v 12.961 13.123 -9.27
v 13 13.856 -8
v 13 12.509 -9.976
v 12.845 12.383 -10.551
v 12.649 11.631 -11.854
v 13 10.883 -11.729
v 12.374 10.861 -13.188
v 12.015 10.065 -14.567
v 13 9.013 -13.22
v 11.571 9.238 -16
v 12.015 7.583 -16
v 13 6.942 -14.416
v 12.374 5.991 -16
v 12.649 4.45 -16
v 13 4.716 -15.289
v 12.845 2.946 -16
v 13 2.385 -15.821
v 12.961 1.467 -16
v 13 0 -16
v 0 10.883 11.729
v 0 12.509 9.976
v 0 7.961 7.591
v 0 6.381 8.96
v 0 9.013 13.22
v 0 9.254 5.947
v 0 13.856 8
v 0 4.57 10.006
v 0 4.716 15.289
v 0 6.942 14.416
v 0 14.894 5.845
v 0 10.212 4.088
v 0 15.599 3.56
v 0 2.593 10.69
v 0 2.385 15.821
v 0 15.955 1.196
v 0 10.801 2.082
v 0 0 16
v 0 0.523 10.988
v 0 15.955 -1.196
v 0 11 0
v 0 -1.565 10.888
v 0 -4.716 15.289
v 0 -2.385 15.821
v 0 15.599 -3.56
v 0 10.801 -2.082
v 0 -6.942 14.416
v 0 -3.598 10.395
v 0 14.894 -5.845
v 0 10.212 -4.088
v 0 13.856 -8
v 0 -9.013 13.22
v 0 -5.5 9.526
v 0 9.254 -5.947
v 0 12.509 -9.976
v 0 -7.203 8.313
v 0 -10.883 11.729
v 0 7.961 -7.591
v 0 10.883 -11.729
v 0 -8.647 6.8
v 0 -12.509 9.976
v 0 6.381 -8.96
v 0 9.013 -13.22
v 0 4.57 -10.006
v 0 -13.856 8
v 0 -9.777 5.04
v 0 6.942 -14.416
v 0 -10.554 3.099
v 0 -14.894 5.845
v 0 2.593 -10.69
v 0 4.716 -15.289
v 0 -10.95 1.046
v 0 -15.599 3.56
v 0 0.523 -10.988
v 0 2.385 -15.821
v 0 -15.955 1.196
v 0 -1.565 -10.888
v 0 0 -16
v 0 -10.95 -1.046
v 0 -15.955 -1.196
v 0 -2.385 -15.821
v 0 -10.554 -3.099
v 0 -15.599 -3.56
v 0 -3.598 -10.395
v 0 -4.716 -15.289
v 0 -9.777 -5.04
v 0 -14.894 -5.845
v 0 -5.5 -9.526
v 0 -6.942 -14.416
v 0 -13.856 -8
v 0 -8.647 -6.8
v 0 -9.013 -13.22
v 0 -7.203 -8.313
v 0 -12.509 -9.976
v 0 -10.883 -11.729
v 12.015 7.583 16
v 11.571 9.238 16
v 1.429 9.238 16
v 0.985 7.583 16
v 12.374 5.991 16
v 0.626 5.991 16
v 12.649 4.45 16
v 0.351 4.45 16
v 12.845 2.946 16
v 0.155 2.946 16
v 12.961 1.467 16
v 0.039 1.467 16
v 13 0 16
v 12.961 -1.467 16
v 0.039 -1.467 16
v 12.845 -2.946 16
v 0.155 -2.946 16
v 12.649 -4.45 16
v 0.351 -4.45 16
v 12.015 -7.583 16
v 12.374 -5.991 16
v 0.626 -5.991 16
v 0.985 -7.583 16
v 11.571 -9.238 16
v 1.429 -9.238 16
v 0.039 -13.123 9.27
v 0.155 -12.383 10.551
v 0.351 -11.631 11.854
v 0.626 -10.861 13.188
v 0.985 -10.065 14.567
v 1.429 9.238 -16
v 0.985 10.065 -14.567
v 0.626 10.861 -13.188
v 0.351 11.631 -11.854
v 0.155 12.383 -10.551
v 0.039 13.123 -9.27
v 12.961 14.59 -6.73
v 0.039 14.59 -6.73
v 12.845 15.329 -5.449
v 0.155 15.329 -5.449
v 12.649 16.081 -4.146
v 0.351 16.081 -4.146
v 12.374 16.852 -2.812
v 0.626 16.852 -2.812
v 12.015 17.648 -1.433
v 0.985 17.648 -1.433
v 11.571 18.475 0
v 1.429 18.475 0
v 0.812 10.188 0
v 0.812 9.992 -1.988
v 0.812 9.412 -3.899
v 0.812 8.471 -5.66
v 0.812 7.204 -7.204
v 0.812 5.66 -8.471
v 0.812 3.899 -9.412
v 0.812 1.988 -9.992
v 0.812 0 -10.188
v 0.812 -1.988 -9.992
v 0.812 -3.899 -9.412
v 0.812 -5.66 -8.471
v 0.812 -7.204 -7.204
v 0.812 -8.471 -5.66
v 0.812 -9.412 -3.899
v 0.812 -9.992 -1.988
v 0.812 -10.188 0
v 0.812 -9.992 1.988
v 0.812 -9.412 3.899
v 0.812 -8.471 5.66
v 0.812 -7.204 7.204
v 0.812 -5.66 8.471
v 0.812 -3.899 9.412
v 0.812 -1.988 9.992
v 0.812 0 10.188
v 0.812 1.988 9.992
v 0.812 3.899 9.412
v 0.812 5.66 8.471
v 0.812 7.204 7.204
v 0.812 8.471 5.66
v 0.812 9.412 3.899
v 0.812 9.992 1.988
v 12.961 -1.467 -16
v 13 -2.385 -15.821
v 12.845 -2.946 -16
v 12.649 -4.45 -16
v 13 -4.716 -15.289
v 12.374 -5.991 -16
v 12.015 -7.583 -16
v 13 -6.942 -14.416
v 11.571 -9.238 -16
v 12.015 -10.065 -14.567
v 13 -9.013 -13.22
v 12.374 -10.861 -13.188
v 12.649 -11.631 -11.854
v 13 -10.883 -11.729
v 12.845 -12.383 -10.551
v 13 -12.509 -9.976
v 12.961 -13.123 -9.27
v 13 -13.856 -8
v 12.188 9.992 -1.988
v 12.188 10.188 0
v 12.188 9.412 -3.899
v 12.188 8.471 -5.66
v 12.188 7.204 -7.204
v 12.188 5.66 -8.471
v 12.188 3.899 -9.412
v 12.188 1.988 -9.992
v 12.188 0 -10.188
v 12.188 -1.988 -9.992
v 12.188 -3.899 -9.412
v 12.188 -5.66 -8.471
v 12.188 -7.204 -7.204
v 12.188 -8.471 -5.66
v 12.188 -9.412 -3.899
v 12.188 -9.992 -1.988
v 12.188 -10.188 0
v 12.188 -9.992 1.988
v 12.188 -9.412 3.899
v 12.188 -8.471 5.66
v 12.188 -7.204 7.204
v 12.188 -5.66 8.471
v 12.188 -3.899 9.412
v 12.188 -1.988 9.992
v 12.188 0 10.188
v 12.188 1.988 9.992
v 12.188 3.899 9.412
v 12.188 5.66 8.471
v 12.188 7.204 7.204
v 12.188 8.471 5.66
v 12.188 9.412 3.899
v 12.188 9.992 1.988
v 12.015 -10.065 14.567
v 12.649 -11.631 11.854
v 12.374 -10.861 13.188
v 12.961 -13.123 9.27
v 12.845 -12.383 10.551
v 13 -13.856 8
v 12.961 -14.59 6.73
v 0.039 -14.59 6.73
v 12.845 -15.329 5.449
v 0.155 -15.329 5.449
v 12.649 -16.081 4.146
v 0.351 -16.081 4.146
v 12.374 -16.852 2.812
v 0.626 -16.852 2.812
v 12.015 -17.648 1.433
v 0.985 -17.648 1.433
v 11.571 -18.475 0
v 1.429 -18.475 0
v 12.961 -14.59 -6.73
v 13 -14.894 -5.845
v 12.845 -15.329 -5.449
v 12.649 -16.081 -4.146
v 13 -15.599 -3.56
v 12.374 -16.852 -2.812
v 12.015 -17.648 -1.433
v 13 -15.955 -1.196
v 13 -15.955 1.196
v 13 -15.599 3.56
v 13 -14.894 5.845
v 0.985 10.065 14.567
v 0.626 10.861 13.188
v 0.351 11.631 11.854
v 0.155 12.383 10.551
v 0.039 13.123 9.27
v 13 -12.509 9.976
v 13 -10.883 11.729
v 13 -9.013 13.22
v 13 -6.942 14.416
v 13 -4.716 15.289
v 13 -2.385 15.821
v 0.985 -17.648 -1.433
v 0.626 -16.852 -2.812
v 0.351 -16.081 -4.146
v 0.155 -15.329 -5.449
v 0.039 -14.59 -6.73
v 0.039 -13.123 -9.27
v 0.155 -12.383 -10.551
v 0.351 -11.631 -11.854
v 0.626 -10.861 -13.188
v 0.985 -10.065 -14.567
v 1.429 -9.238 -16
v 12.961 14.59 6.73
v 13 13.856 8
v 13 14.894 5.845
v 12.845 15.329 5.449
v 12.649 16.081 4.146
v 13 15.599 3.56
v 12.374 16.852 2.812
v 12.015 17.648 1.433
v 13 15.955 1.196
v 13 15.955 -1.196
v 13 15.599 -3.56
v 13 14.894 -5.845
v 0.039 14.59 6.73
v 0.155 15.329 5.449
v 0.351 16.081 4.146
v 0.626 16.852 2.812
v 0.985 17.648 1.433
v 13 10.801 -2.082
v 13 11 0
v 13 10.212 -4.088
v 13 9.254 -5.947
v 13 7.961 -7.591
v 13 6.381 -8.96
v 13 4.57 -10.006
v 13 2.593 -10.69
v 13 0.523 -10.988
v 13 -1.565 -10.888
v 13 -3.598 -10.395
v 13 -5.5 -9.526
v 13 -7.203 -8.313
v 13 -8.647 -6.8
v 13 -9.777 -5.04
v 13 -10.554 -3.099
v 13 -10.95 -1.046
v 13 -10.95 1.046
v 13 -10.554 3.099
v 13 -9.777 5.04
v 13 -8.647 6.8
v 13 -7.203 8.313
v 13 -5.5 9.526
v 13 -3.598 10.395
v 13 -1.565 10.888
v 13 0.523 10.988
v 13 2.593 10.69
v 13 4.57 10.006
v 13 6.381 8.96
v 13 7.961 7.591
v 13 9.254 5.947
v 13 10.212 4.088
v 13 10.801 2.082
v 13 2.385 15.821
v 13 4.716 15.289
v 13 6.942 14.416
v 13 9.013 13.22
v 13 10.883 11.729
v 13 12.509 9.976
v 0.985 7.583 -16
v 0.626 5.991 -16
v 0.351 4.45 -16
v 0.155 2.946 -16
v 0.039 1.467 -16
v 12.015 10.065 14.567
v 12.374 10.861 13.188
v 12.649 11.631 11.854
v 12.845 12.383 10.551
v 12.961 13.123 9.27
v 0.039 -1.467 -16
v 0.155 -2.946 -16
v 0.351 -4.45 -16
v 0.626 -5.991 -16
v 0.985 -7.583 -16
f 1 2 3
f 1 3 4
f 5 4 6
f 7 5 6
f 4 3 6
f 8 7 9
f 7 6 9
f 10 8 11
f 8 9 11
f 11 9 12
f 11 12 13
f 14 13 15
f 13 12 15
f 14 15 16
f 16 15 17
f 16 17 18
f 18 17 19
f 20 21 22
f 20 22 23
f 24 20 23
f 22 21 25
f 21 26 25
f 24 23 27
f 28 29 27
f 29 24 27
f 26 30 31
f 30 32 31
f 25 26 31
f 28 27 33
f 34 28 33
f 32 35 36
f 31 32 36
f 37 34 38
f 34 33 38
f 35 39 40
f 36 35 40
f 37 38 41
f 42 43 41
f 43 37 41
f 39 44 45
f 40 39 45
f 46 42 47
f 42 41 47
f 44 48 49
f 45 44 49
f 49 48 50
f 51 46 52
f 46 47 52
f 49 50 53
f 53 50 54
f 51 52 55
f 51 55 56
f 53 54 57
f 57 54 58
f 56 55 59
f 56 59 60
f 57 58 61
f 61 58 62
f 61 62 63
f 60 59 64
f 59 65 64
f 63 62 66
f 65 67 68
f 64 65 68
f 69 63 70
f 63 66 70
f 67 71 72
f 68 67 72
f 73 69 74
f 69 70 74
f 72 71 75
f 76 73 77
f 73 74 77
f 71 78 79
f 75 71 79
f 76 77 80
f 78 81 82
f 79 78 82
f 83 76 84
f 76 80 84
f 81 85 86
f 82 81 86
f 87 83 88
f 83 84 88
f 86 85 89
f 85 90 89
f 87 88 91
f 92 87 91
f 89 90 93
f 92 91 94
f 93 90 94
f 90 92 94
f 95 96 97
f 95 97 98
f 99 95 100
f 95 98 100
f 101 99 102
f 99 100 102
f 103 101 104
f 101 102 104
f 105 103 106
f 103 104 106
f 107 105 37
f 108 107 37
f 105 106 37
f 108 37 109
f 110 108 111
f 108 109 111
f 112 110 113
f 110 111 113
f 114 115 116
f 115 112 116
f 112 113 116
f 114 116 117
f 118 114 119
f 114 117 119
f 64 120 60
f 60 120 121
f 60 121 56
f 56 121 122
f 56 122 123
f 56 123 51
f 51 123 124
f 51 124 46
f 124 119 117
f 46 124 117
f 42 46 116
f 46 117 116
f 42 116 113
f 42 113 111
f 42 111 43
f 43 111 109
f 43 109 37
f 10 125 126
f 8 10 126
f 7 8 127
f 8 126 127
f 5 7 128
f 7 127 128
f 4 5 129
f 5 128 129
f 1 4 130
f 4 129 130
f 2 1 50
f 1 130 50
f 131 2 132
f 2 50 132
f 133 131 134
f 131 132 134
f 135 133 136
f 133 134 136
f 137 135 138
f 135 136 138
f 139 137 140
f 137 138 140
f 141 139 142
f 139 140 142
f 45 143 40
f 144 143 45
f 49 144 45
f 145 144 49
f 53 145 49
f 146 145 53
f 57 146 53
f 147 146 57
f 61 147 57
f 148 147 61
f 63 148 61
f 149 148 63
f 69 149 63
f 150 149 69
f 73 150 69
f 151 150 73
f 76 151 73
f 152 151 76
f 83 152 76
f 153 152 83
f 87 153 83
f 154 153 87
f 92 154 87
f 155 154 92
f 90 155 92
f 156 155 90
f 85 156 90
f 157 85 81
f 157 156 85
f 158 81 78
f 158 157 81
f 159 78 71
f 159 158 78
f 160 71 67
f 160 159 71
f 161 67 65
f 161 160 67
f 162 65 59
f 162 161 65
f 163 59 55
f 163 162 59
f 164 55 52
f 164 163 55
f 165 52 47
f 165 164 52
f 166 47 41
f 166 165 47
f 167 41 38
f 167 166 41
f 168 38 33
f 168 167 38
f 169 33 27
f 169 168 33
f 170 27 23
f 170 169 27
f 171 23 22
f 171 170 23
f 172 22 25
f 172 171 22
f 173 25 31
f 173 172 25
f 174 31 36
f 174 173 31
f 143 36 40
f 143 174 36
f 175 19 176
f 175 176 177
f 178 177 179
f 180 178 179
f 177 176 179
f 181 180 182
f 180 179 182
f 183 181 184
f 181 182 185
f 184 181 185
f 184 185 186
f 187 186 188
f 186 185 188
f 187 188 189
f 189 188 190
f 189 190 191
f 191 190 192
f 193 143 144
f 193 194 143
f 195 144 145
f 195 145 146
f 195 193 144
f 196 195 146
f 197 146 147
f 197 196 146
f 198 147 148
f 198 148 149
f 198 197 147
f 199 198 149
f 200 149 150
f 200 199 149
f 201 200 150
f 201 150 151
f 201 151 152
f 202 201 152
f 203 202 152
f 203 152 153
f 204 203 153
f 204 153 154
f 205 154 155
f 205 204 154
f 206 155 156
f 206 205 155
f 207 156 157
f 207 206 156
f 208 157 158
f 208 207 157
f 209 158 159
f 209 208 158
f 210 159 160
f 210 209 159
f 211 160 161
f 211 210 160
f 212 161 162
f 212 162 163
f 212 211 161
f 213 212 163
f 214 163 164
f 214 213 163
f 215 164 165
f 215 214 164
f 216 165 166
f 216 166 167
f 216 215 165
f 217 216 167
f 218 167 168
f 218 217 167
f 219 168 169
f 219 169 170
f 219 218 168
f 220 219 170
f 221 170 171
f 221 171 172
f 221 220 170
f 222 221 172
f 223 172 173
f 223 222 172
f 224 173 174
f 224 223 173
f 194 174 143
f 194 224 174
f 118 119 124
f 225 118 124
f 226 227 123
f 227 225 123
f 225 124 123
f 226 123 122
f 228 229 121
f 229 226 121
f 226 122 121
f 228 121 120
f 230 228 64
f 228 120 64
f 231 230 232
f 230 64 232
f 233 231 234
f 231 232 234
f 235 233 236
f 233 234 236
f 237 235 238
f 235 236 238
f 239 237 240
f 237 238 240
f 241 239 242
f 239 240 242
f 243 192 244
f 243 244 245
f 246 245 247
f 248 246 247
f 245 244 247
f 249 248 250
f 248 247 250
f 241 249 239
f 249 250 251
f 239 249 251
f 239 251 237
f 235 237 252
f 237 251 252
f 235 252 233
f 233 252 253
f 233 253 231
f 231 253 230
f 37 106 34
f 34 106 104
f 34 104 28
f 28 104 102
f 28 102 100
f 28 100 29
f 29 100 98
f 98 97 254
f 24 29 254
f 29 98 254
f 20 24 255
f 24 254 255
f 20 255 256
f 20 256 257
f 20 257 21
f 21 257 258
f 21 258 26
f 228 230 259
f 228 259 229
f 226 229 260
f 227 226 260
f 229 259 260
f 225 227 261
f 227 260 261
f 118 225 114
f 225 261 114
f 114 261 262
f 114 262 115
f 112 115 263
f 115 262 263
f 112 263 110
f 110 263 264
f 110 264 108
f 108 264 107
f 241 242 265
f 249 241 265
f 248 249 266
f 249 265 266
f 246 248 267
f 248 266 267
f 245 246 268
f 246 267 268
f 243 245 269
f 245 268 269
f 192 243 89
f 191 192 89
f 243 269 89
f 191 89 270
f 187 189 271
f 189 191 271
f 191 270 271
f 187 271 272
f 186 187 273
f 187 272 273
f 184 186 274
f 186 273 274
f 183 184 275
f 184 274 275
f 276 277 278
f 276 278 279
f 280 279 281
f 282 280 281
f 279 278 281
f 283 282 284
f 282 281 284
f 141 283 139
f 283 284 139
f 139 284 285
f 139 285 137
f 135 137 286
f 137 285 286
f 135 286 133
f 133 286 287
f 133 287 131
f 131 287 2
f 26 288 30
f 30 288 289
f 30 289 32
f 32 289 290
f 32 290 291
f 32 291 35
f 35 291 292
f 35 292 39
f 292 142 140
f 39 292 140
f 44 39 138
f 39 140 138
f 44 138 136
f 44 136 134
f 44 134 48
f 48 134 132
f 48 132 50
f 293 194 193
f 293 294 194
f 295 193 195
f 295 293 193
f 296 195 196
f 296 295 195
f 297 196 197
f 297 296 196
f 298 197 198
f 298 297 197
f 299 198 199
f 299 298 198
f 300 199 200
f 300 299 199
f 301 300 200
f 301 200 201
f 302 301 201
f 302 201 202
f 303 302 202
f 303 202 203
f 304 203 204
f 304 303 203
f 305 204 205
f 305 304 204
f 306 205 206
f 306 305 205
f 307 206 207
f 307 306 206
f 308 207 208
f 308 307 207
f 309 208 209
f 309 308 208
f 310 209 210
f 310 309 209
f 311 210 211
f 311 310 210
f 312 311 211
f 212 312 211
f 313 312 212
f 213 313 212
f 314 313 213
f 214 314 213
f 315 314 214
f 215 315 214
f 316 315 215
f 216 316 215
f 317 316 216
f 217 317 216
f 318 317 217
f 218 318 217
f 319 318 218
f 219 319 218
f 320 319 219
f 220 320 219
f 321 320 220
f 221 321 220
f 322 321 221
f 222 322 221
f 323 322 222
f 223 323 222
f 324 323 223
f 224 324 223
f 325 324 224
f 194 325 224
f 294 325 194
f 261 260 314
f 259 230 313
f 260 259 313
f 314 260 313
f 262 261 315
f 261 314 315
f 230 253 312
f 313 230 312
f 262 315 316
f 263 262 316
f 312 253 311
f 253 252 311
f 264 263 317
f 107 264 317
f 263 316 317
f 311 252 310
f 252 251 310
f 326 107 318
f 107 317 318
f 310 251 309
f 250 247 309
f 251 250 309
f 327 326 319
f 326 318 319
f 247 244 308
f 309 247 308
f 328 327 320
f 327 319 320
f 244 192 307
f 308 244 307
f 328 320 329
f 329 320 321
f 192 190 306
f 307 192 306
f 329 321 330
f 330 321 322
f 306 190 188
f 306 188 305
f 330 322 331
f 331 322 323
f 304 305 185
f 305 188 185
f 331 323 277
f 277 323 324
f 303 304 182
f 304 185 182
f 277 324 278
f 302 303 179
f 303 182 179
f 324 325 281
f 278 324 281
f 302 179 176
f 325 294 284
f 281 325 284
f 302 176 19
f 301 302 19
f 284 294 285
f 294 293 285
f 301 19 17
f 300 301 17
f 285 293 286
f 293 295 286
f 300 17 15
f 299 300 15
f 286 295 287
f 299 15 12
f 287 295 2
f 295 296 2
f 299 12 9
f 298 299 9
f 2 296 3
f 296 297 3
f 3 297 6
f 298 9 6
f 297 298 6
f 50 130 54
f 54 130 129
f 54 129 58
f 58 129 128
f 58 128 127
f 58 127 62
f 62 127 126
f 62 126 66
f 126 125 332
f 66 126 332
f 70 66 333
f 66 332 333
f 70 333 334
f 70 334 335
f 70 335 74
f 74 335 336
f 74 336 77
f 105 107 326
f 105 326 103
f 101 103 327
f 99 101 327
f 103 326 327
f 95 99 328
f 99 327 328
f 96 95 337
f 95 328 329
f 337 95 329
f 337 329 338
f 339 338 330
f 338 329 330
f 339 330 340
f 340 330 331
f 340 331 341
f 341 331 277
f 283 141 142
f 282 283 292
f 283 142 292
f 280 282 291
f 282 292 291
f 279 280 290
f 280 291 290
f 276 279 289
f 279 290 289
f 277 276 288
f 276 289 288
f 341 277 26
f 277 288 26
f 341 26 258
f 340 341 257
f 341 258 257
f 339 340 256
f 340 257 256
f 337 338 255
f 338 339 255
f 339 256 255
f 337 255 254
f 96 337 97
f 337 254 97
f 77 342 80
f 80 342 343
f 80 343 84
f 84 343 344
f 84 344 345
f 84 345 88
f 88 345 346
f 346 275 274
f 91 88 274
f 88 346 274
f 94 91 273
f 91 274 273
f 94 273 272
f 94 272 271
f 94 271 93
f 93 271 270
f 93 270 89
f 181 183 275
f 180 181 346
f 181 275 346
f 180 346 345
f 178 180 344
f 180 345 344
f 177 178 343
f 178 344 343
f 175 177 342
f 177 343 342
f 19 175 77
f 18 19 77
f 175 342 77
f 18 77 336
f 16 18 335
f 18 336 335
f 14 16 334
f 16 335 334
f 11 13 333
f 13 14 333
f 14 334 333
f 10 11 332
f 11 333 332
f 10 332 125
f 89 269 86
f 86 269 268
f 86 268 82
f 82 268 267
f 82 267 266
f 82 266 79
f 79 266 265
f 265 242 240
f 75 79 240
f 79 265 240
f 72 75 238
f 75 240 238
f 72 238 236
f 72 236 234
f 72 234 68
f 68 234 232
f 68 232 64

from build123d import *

# Parameters (mm, degrees)
SKETCH_2_W          = 64
SKETCH_2_H          = 64
CUT_EXTRUDE_1_DEPTH = 26


with BuildPart() as part:
    # 草图1 → 旋转1 (revolve)
    with BuildSketch(Plane.XY):
        Polygon((0, 0), (0, 16), (1.847520861, 19.2), (11.152479139, 19.2), (13, 16), (13, 0), align=None)
    revolve(axis=Axis((13, 0, 0), (-1, 0, 0)))

    # 草图2 → 切除-拉伸1 (cut)
    with BuildSketch(Plane(origin=(0, 0, 0), x_dir=(0, 0, -1), z_dir=(1, 0, 0))):
        Rectangle(SKETCH_2_W, SKETCH_2_H)
        Polygon((-16, -9.237604307), (0, -18.475208614), (16, -9.237604307), (16, 9.237604307), (0, 18.475208614), (-16, 9.237604307), align=None, mode=Mode.SUBTRACT)
    extrude(amount=CUT_EXTRUDE_1_DEPTH, mode=Mode.SUBTRACT)

    # 草图3 → 切除-旋转1 (revolve, cut)
    with BuildSketch(Plane.XY):
        Polygon((0, 0), (0, 11), (0.812, 10.188), (12.188, 10.188), (13, 11), (13, 0), align=None)
    revolve(axis=Axis((13, 0, 0), (-1, 0, 0)), mode=Mode.SUBTRACT)


solid = part.part
